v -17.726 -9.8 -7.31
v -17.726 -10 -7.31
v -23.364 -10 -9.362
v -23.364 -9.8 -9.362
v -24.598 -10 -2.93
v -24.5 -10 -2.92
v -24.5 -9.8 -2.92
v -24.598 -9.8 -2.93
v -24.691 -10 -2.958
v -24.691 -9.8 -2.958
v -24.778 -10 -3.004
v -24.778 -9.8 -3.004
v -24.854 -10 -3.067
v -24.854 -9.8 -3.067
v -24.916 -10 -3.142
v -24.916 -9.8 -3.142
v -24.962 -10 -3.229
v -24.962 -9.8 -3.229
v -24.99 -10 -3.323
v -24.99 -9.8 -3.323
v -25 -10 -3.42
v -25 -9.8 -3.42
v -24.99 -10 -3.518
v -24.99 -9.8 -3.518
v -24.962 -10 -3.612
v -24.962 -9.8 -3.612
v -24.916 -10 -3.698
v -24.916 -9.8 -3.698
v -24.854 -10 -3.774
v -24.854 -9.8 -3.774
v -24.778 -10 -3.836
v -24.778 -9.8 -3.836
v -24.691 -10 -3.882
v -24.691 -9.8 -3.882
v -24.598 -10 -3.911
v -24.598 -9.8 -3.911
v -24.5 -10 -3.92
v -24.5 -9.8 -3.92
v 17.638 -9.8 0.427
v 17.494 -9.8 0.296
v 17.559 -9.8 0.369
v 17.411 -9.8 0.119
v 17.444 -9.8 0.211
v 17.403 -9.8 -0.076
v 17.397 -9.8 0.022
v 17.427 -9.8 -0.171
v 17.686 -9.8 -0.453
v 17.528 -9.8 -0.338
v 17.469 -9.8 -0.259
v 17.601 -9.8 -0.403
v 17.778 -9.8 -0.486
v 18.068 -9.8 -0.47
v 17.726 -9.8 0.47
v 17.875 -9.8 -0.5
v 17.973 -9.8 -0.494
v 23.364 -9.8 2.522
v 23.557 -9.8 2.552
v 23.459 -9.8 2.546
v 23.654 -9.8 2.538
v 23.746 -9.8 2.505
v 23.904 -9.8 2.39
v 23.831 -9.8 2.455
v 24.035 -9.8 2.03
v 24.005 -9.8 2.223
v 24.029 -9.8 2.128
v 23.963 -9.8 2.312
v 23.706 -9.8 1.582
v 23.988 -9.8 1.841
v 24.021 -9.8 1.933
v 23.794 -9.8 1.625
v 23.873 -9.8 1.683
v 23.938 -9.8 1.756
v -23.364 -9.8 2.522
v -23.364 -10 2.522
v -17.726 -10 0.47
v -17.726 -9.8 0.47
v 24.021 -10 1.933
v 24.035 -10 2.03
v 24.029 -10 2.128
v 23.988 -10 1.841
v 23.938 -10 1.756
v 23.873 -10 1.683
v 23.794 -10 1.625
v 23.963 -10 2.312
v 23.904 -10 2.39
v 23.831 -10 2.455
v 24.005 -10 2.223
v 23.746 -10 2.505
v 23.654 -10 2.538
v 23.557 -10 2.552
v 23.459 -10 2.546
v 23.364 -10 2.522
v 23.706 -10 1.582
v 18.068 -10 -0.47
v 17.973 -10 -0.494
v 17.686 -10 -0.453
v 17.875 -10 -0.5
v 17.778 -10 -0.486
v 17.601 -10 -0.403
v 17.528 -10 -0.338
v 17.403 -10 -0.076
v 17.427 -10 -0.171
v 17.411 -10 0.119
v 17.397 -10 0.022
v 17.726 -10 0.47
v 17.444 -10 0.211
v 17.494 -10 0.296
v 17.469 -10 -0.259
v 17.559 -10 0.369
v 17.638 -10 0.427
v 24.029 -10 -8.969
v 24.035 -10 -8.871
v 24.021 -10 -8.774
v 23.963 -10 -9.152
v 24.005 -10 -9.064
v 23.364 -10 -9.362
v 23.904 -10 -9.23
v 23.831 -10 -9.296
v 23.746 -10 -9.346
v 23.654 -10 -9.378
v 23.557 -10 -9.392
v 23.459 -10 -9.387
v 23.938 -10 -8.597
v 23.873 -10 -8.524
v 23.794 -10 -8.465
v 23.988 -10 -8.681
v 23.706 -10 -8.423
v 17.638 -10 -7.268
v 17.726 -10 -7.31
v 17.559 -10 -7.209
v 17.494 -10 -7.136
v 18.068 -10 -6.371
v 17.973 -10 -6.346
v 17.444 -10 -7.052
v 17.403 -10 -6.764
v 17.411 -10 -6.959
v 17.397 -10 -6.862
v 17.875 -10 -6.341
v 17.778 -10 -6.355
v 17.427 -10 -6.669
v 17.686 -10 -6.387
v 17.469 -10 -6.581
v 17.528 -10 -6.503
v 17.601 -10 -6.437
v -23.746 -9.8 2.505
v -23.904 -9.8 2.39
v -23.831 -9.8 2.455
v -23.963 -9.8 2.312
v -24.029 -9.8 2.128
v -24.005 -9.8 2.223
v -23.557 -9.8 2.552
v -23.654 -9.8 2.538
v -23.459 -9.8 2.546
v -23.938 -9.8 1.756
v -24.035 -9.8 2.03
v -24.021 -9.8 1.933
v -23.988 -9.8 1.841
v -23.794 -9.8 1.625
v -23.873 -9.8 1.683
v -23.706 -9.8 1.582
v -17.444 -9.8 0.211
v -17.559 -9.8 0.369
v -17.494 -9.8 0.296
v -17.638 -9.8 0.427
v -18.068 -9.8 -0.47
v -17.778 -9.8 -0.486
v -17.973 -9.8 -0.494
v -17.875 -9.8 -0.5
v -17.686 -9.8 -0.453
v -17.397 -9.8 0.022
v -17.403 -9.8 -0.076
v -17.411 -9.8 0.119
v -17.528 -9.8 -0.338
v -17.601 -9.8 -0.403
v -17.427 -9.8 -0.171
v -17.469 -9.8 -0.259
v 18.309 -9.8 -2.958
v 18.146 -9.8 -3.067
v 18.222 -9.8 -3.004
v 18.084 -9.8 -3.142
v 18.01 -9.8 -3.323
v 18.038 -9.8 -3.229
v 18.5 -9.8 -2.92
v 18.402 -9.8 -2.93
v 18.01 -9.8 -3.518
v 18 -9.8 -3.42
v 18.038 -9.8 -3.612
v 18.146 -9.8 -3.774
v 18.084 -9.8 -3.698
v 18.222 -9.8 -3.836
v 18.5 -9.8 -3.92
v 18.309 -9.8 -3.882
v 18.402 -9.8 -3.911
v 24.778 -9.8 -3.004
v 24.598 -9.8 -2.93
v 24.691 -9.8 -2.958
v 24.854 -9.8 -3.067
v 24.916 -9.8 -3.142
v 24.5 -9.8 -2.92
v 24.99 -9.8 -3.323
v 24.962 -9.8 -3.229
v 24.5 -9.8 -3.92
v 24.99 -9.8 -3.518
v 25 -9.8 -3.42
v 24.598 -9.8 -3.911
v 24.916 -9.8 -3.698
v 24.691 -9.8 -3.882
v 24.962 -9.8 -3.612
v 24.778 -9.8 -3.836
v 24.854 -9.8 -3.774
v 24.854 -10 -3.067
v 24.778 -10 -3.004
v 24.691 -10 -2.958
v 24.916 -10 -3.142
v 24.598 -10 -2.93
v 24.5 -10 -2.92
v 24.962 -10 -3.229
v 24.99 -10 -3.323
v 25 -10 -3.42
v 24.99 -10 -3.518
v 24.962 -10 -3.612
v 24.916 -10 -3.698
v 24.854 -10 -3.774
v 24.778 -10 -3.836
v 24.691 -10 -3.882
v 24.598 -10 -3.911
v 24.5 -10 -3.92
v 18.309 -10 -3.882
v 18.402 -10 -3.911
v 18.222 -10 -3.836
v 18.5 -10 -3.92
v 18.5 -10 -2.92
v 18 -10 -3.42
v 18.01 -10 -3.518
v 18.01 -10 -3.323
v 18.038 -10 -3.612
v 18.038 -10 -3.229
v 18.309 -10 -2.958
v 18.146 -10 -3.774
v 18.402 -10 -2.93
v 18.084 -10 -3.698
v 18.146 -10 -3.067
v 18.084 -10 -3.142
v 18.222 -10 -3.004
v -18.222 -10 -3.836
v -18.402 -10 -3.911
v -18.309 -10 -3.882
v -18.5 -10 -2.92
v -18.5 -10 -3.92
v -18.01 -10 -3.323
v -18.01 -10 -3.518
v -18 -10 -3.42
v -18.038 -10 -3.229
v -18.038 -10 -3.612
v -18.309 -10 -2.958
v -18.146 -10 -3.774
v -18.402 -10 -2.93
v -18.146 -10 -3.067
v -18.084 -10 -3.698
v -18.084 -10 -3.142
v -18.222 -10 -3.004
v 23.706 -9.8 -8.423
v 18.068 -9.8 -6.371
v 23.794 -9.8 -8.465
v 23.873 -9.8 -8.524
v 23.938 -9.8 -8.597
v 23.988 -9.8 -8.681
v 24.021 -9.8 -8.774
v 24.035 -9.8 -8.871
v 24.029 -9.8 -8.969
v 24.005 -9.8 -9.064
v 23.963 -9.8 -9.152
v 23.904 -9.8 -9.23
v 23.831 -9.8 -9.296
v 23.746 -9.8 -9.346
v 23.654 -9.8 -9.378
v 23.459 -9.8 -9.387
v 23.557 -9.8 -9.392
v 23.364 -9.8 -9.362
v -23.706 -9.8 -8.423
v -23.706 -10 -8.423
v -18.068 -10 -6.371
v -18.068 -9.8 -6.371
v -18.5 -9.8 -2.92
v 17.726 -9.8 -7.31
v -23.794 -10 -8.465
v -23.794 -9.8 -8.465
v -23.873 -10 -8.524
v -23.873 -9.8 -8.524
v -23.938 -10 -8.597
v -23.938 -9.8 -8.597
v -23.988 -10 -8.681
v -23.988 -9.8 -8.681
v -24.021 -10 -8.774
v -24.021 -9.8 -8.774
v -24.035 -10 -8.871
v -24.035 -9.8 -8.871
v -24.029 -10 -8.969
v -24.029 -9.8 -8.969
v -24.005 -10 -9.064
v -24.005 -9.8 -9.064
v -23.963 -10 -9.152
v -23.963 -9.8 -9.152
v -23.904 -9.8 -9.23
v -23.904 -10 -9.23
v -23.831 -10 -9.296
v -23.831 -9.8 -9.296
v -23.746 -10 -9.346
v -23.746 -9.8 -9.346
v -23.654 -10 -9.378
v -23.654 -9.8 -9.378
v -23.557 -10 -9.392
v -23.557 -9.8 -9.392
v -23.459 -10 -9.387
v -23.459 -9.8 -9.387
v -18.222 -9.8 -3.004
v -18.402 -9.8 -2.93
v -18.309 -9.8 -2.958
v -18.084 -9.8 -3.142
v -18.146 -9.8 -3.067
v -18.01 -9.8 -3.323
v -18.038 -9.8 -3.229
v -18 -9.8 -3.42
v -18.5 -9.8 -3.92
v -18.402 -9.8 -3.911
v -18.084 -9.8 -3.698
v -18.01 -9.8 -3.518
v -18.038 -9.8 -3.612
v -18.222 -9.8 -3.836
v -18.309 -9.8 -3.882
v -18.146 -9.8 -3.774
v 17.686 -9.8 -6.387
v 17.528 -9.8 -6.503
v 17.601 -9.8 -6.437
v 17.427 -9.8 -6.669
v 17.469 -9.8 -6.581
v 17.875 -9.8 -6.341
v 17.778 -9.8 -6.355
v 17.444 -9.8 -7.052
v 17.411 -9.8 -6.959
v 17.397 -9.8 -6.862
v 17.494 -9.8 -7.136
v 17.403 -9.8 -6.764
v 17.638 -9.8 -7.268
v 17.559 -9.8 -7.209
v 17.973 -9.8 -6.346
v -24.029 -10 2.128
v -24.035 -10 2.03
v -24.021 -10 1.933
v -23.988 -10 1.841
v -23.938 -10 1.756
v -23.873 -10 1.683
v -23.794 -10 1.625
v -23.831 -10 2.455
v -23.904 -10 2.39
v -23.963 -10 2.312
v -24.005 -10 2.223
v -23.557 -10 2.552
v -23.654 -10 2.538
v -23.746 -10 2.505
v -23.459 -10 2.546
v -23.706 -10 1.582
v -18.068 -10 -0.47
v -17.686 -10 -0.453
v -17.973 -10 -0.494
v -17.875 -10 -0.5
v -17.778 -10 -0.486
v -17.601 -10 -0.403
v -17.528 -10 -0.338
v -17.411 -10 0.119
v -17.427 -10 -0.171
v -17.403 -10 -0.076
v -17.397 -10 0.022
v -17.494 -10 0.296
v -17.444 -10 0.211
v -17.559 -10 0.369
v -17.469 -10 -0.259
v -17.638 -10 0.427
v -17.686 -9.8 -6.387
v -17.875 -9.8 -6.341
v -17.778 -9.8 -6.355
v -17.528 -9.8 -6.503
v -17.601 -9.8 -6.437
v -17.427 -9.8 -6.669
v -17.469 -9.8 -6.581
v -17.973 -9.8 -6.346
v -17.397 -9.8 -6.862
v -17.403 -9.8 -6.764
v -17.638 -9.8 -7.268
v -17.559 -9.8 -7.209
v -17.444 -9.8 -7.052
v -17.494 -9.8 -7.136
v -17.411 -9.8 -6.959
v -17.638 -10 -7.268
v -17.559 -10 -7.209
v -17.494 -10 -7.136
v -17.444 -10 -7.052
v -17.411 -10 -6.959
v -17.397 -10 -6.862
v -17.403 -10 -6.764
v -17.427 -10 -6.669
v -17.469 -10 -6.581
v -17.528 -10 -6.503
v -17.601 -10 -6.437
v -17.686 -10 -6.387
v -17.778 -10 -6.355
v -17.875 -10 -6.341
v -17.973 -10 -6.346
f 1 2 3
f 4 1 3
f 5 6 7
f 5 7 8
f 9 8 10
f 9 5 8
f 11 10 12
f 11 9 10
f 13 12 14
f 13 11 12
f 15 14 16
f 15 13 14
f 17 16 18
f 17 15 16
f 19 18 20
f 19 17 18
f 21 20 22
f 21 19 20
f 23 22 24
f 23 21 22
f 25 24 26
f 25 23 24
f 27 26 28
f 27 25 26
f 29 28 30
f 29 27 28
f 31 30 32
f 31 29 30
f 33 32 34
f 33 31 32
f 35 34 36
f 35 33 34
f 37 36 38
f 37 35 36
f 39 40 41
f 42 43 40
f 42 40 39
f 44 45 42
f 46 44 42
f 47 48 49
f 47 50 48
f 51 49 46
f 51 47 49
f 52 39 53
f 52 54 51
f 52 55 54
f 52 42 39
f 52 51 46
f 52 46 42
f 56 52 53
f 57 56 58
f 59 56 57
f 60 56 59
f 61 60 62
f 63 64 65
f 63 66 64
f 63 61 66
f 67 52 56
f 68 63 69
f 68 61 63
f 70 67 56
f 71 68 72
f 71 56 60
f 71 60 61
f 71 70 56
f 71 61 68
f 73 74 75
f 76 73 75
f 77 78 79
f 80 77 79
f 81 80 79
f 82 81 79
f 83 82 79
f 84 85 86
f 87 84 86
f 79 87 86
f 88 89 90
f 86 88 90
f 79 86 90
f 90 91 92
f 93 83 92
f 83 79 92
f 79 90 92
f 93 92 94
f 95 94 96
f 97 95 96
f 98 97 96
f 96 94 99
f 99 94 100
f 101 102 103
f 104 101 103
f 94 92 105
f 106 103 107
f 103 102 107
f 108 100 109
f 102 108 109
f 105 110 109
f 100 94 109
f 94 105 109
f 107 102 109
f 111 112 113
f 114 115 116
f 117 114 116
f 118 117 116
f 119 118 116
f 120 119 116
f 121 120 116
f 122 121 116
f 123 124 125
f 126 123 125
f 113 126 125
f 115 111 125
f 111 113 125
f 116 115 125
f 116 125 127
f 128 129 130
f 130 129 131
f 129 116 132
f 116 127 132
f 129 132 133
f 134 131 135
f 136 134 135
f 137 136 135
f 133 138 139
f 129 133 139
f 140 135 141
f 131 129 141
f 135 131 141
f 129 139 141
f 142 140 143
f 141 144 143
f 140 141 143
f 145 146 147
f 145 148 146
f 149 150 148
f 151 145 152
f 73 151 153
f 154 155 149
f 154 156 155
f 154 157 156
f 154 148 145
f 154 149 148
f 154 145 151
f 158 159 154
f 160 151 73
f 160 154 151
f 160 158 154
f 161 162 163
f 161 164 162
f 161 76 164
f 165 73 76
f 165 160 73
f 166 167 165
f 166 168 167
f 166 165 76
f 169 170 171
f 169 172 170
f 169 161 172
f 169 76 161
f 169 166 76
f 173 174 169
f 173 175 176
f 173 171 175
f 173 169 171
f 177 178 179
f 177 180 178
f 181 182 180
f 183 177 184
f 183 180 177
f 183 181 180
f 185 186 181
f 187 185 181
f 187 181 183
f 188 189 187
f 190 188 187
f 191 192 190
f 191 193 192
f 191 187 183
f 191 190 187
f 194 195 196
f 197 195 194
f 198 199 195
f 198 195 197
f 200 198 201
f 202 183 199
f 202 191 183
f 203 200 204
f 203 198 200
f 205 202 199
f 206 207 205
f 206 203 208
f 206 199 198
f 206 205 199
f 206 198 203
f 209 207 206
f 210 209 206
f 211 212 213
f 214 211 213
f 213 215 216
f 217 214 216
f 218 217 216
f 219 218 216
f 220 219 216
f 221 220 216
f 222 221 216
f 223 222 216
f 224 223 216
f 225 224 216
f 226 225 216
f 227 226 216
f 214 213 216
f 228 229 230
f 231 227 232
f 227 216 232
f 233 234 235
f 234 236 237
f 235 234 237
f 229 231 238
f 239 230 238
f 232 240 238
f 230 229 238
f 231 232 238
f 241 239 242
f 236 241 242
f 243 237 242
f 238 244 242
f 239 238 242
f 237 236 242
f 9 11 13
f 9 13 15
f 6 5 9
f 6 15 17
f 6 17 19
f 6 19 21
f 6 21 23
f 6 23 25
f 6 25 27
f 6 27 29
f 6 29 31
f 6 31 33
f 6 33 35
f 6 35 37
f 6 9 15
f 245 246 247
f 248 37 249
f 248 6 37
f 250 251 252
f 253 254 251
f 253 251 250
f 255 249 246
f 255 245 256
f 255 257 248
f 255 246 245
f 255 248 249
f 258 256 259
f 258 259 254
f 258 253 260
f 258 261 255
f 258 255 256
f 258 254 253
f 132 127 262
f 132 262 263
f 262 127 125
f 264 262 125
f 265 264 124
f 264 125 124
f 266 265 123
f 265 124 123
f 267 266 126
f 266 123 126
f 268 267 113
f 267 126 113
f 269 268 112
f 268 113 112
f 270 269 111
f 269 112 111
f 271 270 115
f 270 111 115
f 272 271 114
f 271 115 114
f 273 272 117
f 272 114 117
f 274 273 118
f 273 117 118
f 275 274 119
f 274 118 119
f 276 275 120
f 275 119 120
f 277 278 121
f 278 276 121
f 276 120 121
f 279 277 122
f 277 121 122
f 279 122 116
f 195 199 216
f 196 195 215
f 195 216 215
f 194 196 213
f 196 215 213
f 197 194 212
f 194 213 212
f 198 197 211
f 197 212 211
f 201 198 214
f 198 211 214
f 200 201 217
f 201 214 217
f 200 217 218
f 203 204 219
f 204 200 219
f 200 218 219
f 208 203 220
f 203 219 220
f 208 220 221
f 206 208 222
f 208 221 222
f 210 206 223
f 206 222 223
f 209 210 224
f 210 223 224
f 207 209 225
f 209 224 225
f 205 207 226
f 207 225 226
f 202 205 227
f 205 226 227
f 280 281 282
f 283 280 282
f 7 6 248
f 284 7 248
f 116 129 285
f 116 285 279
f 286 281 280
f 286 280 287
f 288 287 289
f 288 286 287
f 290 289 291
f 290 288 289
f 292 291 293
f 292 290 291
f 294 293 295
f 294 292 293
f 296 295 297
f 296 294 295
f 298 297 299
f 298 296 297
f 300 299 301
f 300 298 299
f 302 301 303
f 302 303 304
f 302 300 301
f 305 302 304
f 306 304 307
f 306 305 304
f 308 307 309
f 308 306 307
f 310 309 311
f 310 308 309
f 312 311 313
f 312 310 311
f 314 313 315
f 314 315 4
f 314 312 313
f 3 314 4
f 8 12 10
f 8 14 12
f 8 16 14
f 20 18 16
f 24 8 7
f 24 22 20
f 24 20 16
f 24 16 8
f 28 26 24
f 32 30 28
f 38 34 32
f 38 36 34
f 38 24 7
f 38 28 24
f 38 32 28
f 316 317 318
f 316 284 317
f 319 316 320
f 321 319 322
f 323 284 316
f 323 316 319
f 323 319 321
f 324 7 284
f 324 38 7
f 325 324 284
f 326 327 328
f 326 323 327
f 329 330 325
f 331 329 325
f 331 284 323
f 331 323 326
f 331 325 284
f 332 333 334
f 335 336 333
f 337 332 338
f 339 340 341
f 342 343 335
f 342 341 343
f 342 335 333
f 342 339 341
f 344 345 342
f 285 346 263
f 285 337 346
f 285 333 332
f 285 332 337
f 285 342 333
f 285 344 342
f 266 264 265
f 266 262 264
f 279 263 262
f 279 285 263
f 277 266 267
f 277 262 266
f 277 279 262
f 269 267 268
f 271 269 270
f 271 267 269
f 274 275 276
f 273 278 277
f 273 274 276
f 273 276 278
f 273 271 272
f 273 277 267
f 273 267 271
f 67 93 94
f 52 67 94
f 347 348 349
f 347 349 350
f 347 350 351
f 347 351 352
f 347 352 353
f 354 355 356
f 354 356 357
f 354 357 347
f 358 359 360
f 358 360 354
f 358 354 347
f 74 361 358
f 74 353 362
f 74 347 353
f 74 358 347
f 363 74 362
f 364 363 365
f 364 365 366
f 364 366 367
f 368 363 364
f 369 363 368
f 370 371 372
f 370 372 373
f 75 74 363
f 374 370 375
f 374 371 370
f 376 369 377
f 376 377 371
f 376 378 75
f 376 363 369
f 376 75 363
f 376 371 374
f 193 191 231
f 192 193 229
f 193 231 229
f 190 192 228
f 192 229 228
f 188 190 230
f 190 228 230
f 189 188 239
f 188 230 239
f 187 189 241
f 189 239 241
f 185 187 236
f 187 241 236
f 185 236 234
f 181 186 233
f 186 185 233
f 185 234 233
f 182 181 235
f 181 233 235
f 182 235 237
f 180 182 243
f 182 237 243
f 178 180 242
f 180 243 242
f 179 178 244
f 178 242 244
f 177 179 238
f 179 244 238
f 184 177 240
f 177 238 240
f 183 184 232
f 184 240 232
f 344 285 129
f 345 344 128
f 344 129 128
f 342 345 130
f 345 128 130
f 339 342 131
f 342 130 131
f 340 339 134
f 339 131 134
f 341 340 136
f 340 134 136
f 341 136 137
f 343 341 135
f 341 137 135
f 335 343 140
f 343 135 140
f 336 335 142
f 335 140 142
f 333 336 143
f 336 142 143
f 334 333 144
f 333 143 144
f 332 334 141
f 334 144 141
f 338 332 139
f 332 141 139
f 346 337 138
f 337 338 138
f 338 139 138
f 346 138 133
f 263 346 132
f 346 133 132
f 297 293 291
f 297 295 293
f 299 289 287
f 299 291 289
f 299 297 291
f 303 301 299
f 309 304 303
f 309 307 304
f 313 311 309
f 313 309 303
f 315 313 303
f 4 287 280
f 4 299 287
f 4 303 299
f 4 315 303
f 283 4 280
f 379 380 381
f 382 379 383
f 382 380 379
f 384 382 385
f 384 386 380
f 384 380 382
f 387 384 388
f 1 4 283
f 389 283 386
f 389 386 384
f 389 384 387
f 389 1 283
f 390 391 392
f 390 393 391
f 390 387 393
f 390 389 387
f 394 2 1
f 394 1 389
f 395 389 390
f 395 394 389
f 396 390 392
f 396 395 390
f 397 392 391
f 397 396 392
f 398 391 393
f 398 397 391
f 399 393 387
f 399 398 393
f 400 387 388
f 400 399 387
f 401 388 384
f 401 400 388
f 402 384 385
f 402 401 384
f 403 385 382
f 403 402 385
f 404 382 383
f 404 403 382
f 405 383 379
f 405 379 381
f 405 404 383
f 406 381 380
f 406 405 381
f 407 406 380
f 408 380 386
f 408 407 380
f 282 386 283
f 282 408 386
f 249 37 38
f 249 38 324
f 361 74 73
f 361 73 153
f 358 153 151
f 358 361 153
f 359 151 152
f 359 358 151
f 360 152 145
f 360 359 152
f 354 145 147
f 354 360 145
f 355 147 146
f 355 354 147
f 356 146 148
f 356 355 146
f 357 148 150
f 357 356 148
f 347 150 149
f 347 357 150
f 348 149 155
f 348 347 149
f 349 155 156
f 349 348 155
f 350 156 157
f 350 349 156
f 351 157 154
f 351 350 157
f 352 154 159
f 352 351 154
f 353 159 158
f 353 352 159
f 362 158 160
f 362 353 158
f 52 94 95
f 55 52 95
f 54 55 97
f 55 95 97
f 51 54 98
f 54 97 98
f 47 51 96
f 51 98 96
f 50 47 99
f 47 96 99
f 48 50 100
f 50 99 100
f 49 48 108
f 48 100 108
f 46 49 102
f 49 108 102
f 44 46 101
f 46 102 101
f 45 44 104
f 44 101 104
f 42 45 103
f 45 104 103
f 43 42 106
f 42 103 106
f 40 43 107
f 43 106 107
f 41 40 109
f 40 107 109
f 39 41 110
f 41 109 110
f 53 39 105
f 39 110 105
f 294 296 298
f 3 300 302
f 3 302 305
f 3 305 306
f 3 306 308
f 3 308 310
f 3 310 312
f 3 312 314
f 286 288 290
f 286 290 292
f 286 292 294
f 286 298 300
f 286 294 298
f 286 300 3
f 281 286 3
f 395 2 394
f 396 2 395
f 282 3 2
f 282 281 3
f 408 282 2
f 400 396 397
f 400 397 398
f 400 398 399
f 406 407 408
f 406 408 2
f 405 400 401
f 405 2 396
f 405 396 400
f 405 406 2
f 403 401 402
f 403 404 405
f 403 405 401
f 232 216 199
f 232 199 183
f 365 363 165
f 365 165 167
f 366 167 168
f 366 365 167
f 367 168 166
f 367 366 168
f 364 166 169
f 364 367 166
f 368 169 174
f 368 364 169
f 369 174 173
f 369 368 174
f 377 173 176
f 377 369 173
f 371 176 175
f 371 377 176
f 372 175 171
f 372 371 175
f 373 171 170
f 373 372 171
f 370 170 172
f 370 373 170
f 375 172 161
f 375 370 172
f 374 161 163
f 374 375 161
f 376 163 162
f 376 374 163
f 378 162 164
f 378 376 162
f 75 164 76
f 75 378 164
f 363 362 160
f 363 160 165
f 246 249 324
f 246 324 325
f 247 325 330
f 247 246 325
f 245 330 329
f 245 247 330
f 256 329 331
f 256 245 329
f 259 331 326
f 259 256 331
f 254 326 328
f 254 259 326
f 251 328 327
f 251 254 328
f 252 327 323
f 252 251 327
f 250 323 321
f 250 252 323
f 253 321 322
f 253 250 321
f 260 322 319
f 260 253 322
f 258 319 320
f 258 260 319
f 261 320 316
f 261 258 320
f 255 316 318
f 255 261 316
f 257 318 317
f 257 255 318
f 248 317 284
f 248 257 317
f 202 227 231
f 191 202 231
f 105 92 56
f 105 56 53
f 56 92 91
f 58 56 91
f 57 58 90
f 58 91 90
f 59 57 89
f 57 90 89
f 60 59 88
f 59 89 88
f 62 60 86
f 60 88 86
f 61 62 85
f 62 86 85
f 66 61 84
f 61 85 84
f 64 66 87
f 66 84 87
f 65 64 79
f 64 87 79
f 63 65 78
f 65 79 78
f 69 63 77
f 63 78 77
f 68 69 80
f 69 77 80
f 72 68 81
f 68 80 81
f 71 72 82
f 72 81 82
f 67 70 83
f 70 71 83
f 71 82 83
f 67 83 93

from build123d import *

# Parameters (mm, degrees)
BOX004_W     = 62
BOX004_H     = 12
BOX004_DEPTH = 17
BOX003_W     = 60
BOX003_H     = 15
BOX003_DEPTH = 1
PAD009_DEPTH = 10


with BuildPart() as cube:
    # Box004 → Box004 (new body)
    with BuildSketch(Plane(origin=(-31, -9.8, -12), x_dir=(1, 0, 0), z_dir=(0, 0, 1))):
        with Locations((31, 6)):
            Rectangle(BOX004_W, BOX004_H)
    extrude(amount=BOX004_DEPTH)


with BuildPart() as whiskers:
    # Box003 → Box003 (join)
    with BuildSketch(Plane(origin=(-30, 0, -11), x_dir=(1, 0, 0), z_dir=(0, -1, 0))):
        with Locations((30, 7.5)):
            Rectangle(BOX003_W, BOX003_H)
    extrude(amount=BOX003_DEPTH)

    # Sketch035 → Pad009 (join)
    with BuildSketch(Plane.XZ.offset(10)):
        with BuildLine():
            ThreePointArc((-23.364072, 2.521967), (-24.004928, 2.223131), (-23.706092, 1.582275))
            Line((-23.706092, 1.582275), (-18.067936, -0.469846))
            ThreePointArc((-18.067936, -0.469846), (-17.427074, -0.171012), (-17.725916, 0.469846))
            Line((-23.364072, 2.521967), (-17.725916, 0.469846))
        make_face()
        with BuildLine():
            ThreePointArc((-24.5, -2.920201), (-25, -3.420201), (-24.5, -3.920201))
            Line((-24.5, -3.920201), (-18.5, -3.920201))
            ThreePointArc((-18.5, -3.920201), (-18, -3.420201), (-18.5, -2.920201))
            Line((-24.5, -2.920201), (-18.5, -2.920201))
        make_face()
        with BuildLine():
            ThreePointArc((-23.706092, -8.422678), (-24.004928, -9.063534), (-23.364072, -9.36237))
            Line((-17.725916, -7.310249), (-23.364072, -9.36237))
            ThreePointArc((-17.725916, -7.310249), (-17.427079, -6.669393), (-18.067936, -6.370557))
            Line((-23.706092, -8.422678), (-18.067936, -6.370557))
        make_face()
    pad009 = extrude(amount=-PAD009_DEPTH)

    # Mirrored005: Pad009 across Sketch035 V_Axis
    add(pad009.mirror(Plane(origin=(0, -10, 0), x_dir=(0, -1, 0), z_dir=(1, 0, 0))))

    # Cut: cut Cube
    add(cube.part, mode=Mode.SUBTRACT)


solid = whiskers.part
